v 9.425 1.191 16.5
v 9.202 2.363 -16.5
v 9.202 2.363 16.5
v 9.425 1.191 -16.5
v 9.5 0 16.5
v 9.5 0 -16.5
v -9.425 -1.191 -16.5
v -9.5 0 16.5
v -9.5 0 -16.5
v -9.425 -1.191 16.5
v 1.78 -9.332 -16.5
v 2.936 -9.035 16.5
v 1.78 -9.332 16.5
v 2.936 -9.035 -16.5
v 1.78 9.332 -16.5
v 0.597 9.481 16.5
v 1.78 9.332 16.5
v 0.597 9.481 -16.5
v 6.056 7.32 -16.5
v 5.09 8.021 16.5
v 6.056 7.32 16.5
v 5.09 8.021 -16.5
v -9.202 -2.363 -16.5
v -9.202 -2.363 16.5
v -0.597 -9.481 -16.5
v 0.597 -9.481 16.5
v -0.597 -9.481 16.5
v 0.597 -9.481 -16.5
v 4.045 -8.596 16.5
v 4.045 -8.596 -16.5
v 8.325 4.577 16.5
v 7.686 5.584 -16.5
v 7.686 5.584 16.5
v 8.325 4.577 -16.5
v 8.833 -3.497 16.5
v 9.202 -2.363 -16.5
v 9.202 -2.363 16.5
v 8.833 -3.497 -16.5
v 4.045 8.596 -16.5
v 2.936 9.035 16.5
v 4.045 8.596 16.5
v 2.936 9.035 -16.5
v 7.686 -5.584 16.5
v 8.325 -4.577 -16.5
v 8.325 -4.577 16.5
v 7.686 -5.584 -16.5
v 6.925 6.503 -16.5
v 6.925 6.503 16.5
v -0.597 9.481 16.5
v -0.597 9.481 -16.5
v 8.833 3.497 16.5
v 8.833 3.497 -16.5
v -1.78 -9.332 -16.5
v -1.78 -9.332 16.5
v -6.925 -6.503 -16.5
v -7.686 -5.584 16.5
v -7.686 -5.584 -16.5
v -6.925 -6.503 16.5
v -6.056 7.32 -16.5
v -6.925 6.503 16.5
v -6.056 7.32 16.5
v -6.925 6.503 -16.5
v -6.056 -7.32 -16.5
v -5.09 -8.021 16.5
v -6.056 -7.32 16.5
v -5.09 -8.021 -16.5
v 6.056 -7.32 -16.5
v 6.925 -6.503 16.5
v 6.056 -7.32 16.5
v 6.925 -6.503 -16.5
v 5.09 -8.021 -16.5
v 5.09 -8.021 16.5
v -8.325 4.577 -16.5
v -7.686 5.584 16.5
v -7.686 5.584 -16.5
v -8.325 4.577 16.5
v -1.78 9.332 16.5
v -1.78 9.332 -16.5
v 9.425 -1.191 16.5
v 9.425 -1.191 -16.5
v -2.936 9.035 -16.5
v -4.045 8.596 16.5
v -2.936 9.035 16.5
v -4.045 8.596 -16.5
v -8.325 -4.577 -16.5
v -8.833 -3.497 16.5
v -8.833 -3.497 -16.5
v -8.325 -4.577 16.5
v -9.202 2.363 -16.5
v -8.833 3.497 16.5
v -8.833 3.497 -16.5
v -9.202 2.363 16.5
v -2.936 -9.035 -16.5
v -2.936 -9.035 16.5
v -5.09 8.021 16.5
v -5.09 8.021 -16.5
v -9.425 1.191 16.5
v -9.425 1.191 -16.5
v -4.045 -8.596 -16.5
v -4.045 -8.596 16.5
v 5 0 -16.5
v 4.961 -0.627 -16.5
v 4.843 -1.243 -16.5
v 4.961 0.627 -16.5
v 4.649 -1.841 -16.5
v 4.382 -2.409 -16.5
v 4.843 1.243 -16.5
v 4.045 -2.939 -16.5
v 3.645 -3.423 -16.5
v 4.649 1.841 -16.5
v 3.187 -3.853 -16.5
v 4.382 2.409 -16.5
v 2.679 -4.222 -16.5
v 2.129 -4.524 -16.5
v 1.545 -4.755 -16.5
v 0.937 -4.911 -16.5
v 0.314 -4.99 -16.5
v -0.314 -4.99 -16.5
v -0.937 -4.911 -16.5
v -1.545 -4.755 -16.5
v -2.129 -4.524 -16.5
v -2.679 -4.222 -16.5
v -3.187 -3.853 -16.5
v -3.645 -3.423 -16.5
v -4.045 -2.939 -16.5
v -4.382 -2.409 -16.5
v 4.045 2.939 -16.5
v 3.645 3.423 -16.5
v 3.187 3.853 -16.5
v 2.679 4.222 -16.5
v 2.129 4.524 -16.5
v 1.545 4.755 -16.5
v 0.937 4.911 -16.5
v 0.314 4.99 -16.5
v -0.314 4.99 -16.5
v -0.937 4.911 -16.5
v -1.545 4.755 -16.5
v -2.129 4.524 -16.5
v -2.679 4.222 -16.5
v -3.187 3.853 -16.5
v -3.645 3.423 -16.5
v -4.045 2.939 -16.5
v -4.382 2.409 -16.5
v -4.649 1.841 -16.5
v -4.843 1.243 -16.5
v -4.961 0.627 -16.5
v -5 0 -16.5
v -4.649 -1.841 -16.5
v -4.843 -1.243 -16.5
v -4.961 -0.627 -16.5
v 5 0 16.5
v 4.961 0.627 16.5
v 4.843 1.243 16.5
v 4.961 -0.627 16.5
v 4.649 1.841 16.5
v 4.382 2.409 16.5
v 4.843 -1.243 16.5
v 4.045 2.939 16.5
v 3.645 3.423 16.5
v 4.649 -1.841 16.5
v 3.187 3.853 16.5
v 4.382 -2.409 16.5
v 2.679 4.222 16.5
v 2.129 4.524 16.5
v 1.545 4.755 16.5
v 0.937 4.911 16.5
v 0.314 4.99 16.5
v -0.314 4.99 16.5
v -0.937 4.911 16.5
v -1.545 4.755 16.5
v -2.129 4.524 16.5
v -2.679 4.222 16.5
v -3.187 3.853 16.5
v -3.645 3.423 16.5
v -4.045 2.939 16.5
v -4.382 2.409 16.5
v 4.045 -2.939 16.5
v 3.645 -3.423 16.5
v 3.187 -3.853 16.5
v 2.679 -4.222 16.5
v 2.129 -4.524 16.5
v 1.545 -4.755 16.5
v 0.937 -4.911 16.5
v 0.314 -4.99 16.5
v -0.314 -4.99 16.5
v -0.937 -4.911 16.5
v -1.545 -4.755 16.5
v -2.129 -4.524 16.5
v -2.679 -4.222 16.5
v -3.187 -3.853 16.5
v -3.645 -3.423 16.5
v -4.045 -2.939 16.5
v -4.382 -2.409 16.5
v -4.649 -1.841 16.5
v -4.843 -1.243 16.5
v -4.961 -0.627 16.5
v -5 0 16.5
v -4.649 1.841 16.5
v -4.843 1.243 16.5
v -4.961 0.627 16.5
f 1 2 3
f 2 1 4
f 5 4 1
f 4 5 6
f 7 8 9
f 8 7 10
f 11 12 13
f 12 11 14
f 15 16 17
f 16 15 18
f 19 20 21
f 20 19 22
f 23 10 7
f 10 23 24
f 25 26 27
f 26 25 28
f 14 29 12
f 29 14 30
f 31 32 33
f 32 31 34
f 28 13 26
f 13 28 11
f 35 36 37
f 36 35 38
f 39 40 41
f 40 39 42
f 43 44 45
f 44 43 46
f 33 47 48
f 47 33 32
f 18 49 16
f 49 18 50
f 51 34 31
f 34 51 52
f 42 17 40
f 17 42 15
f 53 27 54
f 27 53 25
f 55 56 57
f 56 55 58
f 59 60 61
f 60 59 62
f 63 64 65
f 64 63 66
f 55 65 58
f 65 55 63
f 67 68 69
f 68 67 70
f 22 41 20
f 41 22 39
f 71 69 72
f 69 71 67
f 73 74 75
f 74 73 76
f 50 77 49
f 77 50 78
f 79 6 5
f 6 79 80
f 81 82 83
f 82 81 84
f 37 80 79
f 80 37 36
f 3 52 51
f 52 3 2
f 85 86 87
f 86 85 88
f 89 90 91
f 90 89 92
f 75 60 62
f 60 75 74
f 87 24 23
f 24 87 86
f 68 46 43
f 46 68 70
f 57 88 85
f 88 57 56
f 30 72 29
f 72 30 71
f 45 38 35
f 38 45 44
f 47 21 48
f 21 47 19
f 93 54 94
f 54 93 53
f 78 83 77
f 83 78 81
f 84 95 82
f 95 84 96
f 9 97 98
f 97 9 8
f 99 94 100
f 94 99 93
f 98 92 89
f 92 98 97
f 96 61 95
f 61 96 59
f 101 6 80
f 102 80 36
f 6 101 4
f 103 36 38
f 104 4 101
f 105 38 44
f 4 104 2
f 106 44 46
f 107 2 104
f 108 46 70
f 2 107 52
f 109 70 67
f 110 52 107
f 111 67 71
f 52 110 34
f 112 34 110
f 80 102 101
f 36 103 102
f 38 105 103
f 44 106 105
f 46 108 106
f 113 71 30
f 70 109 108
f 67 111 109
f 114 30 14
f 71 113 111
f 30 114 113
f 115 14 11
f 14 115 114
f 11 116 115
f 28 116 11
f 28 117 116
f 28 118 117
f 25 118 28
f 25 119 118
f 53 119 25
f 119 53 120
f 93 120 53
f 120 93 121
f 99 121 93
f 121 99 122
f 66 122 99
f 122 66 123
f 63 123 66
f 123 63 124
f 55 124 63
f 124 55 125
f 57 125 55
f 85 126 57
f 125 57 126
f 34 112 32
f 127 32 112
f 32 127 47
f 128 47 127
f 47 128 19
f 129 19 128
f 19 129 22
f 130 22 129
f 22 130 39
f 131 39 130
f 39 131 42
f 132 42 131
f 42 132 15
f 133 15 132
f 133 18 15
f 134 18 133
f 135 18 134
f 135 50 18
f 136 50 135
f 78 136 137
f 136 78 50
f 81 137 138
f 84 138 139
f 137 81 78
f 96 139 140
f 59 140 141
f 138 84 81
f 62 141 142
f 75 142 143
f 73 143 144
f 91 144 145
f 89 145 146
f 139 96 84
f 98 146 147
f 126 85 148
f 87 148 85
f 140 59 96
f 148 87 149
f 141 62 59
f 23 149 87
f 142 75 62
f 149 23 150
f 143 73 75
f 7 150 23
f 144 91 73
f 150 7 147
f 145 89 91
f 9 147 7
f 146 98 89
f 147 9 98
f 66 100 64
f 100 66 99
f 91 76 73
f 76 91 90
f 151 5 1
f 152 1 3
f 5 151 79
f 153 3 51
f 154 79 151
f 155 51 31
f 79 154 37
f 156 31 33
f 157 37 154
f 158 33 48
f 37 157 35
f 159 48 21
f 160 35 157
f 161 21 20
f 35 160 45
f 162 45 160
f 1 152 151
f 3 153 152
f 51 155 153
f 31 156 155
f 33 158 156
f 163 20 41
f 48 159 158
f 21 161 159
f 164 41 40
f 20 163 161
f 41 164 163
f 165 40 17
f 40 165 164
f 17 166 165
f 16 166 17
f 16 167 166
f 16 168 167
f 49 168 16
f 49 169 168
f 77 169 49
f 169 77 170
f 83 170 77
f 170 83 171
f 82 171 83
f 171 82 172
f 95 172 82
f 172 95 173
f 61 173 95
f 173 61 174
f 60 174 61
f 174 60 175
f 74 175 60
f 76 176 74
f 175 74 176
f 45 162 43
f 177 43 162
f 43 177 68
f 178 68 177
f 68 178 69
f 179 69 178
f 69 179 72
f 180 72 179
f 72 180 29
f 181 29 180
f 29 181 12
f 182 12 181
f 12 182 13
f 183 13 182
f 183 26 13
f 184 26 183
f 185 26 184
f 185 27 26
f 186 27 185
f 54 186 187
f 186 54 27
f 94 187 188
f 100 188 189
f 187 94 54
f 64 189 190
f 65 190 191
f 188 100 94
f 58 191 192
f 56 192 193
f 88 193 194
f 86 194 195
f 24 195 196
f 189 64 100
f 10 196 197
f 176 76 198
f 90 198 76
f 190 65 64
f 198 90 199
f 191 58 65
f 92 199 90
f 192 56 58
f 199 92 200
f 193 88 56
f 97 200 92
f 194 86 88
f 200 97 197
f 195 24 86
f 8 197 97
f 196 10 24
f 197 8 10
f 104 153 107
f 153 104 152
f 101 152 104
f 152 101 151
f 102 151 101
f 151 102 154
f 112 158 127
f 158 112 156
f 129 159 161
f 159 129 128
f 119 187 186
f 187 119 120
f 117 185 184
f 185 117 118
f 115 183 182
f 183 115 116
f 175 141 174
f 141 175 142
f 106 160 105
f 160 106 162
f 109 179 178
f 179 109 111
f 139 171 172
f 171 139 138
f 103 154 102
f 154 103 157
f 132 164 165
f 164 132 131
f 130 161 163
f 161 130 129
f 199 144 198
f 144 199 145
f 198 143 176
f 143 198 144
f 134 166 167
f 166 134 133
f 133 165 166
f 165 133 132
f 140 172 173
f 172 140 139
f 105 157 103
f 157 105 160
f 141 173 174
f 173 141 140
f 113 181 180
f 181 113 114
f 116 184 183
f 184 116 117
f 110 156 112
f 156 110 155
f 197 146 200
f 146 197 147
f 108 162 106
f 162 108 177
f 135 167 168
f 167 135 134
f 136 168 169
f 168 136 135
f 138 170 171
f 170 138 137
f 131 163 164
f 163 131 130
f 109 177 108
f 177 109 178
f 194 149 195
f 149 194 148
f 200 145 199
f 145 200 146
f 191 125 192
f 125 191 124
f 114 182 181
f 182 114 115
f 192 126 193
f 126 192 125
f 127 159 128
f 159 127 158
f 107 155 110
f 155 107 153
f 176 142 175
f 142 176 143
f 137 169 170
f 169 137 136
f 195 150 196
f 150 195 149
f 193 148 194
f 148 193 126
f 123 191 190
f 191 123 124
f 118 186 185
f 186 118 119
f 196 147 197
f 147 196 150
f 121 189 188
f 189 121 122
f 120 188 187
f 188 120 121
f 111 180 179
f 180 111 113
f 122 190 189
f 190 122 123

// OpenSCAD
$fn = 50;


difference() {
	union() {
		translate(v = [0, 0, -16.5000000000]) {
			cylinder(h = 33, r = 9.5000000000);
		}
	}
	union() {
		translate(v = [0, 0, -100.0000000000]) {
			cylinder(h = 200, r = 5.0000000000);
		}
	}
}
